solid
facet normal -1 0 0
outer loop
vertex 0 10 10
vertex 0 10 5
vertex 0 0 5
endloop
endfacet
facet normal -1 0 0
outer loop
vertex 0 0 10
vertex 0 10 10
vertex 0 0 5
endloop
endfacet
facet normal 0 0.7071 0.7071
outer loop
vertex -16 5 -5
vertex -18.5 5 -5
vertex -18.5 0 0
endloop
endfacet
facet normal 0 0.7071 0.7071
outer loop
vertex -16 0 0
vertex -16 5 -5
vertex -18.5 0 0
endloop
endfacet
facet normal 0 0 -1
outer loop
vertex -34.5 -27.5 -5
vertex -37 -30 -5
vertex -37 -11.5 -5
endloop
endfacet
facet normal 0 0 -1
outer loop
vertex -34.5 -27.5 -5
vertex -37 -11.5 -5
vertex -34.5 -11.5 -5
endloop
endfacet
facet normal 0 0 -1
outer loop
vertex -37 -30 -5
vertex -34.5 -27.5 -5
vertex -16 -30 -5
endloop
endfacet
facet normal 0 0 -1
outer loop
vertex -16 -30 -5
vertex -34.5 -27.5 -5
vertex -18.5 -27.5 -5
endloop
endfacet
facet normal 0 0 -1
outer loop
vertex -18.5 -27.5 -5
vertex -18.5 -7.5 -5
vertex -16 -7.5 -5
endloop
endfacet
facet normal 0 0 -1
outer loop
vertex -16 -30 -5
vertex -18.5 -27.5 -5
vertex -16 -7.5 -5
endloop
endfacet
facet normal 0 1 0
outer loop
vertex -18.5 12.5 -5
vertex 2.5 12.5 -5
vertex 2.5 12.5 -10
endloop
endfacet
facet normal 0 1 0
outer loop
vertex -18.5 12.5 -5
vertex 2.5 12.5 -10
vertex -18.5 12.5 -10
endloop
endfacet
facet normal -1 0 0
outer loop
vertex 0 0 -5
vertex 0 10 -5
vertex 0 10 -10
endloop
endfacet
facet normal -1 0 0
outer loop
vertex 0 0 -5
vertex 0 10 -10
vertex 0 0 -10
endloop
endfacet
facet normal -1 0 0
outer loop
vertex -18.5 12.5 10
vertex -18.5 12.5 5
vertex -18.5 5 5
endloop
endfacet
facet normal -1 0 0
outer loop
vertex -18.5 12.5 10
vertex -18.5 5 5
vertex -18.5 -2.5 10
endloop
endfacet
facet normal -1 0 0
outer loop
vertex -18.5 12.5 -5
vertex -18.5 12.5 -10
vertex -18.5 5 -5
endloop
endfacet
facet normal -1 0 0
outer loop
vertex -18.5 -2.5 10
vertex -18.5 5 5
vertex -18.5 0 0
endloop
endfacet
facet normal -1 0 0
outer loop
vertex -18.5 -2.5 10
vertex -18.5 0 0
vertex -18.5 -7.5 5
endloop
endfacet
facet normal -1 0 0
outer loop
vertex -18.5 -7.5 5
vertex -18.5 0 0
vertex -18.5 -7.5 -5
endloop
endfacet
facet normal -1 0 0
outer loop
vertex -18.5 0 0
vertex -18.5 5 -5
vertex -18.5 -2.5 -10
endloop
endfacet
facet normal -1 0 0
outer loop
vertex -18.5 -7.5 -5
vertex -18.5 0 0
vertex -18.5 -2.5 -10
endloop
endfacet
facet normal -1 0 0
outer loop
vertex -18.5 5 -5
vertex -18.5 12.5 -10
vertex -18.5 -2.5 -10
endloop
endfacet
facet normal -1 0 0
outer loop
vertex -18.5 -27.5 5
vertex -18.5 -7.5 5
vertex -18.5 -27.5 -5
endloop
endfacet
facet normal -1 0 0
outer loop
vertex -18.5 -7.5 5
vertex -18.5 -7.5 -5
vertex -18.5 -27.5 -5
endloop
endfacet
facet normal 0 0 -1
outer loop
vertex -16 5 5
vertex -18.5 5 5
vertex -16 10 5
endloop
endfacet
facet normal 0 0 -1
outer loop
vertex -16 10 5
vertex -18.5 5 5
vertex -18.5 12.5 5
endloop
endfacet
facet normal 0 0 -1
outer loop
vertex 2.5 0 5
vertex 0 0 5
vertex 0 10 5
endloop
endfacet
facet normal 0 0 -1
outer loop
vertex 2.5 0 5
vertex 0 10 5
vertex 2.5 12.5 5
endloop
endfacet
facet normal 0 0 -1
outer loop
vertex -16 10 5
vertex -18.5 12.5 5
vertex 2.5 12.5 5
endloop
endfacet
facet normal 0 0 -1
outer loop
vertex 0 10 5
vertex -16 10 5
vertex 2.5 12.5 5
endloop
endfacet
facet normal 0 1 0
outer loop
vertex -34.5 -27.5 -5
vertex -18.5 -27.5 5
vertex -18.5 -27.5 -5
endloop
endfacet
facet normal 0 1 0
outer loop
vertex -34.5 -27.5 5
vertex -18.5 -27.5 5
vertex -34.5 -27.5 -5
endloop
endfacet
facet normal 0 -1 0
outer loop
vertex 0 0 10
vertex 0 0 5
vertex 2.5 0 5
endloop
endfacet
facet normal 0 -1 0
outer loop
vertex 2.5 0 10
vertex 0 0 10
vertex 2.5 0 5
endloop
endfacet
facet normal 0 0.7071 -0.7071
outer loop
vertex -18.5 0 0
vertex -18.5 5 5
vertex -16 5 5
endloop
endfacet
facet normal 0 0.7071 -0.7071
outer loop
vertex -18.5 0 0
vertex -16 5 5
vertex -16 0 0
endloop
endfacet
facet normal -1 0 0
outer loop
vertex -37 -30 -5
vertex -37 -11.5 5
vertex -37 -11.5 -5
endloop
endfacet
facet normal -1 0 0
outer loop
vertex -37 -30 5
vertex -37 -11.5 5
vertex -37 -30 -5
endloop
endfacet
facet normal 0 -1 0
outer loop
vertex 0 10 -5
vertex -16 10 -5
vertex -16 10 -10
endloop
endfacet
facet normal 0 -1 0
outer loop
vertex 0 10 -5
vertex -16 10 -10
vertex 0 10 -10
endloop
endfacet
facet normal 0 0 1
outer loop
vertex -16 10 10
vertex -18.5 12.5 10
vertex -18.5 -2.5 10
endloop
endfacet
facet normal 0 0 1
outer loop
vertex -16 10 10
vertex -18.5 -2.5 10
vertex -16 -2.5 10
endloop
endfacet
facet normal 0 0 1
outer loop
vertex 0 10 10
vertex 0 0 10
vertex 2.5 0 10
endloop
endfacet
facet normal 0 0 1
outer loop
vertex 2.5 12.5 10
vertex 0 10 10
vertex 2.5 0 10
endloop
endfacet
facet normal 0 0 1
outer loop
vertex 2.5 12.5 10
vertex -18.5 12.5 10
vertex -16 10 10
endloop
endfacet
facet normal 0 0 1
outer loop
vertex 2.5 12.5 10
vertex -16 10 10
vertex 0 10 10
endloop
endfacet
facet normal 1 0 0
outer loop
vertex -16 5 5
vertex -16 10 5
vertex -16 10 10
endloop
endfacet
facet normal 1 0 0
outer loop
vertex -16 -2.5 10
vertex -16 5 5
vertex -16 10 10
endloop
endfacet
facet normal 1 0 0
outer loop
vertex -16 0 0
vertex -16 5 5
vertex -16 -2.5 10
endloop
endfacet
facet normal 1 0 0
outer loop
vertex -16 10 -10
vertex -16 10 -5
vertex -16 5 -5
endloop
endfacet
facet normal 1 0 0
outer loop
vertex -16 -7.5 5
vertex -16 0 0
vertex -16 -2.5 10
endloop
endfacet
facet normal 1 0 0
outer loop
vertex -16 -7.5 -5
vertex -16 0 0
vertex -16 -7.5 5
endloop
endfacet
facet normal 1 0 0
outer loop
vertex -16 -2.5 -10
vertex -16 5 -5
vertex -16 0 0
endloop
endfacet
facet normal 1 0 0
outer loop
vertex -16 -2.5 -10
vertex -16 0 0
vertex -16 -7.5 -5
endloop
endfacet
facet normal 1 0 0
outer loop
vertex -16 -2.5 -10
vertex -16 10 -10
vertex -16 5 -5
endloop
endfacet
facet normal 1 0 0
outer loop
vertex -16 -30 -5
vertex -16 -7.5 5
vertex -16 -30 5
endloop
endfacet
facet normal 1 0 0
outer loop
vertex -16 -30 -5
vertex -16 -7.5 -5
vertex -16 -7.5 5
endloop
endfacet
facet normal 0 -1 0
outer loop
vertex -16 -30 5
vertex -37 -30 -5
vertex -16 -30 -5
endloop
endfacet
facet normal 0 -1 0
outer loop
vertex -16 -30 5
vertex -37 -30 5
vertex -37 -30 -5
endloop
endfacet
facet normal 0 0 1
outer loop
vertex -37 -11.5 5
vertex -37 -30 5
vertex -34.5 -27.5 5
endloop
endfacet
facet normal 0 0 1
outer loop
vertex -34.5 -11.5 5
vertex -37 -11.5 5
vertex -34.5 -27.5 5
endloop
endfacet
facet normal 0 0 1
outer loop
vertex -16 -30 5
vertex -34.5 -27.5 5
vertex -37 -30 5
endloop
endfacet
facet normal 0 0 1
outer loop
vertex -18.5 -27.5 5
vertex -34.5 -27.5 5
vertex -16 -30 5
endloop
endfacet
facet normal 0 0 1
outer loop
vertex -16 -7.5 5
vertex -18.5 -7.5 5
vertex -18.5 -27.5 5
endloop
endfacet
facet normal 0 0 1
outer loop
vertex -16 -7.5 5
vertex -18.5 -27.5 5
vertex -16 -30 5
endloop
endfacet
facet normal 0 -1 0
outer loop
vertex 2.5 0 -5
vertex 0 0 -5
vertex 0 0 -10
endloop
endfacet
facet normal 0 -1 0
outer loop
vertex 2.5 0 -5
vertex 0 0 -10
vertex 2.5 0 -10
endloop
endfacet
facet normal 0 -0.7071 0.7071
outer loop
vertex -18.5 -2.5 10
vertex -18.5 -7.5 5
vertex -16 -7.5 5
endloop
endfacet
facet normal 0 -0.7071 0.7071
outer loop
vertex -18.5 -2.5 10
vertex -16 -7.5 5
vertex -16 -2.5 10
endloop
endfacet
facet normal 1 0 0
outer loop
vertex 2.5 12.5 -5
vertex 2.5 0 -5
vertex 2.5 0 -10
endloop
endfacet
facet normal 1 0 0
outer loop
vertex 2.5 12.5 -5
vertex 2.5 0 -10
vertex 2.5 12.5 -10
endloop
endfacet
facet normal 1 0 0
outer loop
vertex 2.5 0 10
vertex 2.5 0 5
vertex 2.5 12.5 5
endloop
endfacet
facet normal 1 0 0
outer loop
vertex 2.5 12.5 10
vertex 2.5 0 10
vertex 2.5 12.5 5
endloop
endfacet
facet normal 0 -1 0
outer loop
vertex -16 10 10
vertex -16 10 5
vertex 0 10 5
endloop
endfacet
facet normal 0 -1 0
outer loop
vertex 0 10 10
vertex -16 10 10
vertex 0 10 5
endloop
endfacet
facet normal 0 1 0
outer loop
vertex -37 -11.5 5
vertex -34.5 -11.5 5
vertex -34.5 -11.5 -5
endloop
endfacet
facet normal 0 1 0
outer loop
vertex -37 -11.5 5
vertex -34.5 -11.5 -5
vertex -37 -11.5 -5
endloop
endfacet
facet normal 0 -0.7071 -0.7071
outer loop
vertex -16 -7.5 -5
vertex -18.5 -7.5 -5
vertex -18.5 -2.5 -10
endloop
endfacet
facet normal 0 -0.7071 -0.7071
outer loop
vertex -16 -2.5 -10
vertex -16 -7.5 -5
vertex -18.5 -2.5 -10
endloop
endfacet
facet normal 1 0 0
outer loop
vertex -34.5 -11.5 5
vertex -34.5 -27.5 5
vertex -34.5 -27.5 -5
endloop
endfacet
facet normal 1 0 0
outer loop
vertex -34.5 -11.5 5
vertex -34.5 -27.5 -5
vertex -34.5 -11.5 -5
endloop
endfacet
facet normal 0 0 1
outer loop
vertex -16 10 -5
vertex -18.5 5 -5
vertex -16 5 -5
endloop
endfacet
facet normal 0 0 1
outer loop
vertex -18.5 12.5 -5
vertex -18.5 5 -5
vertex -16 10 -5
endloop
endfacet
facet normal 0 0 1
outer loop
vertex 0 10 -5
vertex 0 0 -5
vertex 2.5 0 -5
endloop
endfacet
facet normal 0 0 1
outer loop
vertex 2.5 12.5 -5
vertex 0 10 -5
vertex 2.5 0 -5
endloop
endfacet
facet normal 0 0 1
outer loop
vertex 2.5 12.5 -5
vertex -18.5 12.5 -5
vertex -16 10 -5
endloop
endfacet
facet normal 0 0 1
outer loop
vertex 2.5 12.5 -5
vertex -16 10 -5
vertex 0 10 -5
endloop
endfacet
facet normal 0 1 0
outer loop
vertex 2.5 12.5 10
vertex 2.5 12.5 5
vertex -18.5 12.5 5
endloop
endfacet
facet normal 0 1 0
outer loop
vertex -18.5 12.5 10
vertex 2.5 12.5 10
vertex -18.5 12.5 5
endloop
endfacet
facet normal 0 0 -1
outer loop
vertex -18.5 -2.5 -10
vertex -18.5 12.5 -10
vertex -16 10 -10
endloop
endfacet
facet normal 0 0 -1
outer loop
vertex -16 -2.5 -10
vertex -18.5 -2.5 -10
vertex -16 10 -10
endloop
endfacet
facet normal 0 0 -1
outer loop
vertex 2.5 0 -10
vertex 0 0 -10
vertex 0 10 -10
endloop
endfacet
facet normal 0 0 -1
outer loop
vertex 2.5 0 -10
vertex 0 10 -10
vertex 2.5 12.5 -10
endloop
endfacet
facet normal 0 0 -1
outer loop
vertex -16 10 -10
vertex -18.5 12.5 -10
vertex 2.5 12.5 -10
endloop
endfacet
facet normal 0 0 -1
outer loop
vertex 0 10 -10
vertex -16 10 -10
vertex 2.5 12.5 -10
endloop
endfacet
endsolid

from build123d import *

# Parameters (mm, degrees)
F1_DEPTH = 5
F2_W     = 2.5
F2_H     = 2.5
F3_DEPTH = 5
F5_DEPTH = 2.5


with BuildPart() as f1:
    # F0 (on Top) → F1 (new body)
    with BuildSketch(Plane.XY):
        Polygon((-16, -30), (-16, 0), (-18.5, 0), (-18.5, -27.5), (-34.5, -27.5), (-34.5, -11.5), (-37, -11.5), (-37, -30), align=None)
    extrude(amount=F1_DEPTH)

    # F2 (on face) → F3 (join)
    with BuildSketch(Plane.XY.offset(5)):
        Polygon((2.5, 12.5), (-18.5, 12.5), (-18.5, 0), (-16, 0), (-16, 10), (0, 10), (0, 0), (2.5, 0), align=None)
        with Locations((-17.25, -1.25)):
            Rectangle(F2_W, F2_H)
    extrude(amount=F3_DEPTH)

    # F4 (on face) → F5 (join, through all)
    with BuildSketch(Plane(origin=(-18.5, 0, 0), x_dir=(0, -1, 0), z_dir=(-1, 0, 0))):
        Polygon((0, 5), (-5, 5), (0, 0), align=None)
        Polygon((7.5, 5), (2.5, 10), (2.5, 5), align=None)
    extrude(amount=-F5_DEPTH)

    # F6: F1 across plane


with BuildPart() as f1_1:
    add(f1.part)
    add(f1.part.mirror(Plane.XY))


solid = f1_1.part
